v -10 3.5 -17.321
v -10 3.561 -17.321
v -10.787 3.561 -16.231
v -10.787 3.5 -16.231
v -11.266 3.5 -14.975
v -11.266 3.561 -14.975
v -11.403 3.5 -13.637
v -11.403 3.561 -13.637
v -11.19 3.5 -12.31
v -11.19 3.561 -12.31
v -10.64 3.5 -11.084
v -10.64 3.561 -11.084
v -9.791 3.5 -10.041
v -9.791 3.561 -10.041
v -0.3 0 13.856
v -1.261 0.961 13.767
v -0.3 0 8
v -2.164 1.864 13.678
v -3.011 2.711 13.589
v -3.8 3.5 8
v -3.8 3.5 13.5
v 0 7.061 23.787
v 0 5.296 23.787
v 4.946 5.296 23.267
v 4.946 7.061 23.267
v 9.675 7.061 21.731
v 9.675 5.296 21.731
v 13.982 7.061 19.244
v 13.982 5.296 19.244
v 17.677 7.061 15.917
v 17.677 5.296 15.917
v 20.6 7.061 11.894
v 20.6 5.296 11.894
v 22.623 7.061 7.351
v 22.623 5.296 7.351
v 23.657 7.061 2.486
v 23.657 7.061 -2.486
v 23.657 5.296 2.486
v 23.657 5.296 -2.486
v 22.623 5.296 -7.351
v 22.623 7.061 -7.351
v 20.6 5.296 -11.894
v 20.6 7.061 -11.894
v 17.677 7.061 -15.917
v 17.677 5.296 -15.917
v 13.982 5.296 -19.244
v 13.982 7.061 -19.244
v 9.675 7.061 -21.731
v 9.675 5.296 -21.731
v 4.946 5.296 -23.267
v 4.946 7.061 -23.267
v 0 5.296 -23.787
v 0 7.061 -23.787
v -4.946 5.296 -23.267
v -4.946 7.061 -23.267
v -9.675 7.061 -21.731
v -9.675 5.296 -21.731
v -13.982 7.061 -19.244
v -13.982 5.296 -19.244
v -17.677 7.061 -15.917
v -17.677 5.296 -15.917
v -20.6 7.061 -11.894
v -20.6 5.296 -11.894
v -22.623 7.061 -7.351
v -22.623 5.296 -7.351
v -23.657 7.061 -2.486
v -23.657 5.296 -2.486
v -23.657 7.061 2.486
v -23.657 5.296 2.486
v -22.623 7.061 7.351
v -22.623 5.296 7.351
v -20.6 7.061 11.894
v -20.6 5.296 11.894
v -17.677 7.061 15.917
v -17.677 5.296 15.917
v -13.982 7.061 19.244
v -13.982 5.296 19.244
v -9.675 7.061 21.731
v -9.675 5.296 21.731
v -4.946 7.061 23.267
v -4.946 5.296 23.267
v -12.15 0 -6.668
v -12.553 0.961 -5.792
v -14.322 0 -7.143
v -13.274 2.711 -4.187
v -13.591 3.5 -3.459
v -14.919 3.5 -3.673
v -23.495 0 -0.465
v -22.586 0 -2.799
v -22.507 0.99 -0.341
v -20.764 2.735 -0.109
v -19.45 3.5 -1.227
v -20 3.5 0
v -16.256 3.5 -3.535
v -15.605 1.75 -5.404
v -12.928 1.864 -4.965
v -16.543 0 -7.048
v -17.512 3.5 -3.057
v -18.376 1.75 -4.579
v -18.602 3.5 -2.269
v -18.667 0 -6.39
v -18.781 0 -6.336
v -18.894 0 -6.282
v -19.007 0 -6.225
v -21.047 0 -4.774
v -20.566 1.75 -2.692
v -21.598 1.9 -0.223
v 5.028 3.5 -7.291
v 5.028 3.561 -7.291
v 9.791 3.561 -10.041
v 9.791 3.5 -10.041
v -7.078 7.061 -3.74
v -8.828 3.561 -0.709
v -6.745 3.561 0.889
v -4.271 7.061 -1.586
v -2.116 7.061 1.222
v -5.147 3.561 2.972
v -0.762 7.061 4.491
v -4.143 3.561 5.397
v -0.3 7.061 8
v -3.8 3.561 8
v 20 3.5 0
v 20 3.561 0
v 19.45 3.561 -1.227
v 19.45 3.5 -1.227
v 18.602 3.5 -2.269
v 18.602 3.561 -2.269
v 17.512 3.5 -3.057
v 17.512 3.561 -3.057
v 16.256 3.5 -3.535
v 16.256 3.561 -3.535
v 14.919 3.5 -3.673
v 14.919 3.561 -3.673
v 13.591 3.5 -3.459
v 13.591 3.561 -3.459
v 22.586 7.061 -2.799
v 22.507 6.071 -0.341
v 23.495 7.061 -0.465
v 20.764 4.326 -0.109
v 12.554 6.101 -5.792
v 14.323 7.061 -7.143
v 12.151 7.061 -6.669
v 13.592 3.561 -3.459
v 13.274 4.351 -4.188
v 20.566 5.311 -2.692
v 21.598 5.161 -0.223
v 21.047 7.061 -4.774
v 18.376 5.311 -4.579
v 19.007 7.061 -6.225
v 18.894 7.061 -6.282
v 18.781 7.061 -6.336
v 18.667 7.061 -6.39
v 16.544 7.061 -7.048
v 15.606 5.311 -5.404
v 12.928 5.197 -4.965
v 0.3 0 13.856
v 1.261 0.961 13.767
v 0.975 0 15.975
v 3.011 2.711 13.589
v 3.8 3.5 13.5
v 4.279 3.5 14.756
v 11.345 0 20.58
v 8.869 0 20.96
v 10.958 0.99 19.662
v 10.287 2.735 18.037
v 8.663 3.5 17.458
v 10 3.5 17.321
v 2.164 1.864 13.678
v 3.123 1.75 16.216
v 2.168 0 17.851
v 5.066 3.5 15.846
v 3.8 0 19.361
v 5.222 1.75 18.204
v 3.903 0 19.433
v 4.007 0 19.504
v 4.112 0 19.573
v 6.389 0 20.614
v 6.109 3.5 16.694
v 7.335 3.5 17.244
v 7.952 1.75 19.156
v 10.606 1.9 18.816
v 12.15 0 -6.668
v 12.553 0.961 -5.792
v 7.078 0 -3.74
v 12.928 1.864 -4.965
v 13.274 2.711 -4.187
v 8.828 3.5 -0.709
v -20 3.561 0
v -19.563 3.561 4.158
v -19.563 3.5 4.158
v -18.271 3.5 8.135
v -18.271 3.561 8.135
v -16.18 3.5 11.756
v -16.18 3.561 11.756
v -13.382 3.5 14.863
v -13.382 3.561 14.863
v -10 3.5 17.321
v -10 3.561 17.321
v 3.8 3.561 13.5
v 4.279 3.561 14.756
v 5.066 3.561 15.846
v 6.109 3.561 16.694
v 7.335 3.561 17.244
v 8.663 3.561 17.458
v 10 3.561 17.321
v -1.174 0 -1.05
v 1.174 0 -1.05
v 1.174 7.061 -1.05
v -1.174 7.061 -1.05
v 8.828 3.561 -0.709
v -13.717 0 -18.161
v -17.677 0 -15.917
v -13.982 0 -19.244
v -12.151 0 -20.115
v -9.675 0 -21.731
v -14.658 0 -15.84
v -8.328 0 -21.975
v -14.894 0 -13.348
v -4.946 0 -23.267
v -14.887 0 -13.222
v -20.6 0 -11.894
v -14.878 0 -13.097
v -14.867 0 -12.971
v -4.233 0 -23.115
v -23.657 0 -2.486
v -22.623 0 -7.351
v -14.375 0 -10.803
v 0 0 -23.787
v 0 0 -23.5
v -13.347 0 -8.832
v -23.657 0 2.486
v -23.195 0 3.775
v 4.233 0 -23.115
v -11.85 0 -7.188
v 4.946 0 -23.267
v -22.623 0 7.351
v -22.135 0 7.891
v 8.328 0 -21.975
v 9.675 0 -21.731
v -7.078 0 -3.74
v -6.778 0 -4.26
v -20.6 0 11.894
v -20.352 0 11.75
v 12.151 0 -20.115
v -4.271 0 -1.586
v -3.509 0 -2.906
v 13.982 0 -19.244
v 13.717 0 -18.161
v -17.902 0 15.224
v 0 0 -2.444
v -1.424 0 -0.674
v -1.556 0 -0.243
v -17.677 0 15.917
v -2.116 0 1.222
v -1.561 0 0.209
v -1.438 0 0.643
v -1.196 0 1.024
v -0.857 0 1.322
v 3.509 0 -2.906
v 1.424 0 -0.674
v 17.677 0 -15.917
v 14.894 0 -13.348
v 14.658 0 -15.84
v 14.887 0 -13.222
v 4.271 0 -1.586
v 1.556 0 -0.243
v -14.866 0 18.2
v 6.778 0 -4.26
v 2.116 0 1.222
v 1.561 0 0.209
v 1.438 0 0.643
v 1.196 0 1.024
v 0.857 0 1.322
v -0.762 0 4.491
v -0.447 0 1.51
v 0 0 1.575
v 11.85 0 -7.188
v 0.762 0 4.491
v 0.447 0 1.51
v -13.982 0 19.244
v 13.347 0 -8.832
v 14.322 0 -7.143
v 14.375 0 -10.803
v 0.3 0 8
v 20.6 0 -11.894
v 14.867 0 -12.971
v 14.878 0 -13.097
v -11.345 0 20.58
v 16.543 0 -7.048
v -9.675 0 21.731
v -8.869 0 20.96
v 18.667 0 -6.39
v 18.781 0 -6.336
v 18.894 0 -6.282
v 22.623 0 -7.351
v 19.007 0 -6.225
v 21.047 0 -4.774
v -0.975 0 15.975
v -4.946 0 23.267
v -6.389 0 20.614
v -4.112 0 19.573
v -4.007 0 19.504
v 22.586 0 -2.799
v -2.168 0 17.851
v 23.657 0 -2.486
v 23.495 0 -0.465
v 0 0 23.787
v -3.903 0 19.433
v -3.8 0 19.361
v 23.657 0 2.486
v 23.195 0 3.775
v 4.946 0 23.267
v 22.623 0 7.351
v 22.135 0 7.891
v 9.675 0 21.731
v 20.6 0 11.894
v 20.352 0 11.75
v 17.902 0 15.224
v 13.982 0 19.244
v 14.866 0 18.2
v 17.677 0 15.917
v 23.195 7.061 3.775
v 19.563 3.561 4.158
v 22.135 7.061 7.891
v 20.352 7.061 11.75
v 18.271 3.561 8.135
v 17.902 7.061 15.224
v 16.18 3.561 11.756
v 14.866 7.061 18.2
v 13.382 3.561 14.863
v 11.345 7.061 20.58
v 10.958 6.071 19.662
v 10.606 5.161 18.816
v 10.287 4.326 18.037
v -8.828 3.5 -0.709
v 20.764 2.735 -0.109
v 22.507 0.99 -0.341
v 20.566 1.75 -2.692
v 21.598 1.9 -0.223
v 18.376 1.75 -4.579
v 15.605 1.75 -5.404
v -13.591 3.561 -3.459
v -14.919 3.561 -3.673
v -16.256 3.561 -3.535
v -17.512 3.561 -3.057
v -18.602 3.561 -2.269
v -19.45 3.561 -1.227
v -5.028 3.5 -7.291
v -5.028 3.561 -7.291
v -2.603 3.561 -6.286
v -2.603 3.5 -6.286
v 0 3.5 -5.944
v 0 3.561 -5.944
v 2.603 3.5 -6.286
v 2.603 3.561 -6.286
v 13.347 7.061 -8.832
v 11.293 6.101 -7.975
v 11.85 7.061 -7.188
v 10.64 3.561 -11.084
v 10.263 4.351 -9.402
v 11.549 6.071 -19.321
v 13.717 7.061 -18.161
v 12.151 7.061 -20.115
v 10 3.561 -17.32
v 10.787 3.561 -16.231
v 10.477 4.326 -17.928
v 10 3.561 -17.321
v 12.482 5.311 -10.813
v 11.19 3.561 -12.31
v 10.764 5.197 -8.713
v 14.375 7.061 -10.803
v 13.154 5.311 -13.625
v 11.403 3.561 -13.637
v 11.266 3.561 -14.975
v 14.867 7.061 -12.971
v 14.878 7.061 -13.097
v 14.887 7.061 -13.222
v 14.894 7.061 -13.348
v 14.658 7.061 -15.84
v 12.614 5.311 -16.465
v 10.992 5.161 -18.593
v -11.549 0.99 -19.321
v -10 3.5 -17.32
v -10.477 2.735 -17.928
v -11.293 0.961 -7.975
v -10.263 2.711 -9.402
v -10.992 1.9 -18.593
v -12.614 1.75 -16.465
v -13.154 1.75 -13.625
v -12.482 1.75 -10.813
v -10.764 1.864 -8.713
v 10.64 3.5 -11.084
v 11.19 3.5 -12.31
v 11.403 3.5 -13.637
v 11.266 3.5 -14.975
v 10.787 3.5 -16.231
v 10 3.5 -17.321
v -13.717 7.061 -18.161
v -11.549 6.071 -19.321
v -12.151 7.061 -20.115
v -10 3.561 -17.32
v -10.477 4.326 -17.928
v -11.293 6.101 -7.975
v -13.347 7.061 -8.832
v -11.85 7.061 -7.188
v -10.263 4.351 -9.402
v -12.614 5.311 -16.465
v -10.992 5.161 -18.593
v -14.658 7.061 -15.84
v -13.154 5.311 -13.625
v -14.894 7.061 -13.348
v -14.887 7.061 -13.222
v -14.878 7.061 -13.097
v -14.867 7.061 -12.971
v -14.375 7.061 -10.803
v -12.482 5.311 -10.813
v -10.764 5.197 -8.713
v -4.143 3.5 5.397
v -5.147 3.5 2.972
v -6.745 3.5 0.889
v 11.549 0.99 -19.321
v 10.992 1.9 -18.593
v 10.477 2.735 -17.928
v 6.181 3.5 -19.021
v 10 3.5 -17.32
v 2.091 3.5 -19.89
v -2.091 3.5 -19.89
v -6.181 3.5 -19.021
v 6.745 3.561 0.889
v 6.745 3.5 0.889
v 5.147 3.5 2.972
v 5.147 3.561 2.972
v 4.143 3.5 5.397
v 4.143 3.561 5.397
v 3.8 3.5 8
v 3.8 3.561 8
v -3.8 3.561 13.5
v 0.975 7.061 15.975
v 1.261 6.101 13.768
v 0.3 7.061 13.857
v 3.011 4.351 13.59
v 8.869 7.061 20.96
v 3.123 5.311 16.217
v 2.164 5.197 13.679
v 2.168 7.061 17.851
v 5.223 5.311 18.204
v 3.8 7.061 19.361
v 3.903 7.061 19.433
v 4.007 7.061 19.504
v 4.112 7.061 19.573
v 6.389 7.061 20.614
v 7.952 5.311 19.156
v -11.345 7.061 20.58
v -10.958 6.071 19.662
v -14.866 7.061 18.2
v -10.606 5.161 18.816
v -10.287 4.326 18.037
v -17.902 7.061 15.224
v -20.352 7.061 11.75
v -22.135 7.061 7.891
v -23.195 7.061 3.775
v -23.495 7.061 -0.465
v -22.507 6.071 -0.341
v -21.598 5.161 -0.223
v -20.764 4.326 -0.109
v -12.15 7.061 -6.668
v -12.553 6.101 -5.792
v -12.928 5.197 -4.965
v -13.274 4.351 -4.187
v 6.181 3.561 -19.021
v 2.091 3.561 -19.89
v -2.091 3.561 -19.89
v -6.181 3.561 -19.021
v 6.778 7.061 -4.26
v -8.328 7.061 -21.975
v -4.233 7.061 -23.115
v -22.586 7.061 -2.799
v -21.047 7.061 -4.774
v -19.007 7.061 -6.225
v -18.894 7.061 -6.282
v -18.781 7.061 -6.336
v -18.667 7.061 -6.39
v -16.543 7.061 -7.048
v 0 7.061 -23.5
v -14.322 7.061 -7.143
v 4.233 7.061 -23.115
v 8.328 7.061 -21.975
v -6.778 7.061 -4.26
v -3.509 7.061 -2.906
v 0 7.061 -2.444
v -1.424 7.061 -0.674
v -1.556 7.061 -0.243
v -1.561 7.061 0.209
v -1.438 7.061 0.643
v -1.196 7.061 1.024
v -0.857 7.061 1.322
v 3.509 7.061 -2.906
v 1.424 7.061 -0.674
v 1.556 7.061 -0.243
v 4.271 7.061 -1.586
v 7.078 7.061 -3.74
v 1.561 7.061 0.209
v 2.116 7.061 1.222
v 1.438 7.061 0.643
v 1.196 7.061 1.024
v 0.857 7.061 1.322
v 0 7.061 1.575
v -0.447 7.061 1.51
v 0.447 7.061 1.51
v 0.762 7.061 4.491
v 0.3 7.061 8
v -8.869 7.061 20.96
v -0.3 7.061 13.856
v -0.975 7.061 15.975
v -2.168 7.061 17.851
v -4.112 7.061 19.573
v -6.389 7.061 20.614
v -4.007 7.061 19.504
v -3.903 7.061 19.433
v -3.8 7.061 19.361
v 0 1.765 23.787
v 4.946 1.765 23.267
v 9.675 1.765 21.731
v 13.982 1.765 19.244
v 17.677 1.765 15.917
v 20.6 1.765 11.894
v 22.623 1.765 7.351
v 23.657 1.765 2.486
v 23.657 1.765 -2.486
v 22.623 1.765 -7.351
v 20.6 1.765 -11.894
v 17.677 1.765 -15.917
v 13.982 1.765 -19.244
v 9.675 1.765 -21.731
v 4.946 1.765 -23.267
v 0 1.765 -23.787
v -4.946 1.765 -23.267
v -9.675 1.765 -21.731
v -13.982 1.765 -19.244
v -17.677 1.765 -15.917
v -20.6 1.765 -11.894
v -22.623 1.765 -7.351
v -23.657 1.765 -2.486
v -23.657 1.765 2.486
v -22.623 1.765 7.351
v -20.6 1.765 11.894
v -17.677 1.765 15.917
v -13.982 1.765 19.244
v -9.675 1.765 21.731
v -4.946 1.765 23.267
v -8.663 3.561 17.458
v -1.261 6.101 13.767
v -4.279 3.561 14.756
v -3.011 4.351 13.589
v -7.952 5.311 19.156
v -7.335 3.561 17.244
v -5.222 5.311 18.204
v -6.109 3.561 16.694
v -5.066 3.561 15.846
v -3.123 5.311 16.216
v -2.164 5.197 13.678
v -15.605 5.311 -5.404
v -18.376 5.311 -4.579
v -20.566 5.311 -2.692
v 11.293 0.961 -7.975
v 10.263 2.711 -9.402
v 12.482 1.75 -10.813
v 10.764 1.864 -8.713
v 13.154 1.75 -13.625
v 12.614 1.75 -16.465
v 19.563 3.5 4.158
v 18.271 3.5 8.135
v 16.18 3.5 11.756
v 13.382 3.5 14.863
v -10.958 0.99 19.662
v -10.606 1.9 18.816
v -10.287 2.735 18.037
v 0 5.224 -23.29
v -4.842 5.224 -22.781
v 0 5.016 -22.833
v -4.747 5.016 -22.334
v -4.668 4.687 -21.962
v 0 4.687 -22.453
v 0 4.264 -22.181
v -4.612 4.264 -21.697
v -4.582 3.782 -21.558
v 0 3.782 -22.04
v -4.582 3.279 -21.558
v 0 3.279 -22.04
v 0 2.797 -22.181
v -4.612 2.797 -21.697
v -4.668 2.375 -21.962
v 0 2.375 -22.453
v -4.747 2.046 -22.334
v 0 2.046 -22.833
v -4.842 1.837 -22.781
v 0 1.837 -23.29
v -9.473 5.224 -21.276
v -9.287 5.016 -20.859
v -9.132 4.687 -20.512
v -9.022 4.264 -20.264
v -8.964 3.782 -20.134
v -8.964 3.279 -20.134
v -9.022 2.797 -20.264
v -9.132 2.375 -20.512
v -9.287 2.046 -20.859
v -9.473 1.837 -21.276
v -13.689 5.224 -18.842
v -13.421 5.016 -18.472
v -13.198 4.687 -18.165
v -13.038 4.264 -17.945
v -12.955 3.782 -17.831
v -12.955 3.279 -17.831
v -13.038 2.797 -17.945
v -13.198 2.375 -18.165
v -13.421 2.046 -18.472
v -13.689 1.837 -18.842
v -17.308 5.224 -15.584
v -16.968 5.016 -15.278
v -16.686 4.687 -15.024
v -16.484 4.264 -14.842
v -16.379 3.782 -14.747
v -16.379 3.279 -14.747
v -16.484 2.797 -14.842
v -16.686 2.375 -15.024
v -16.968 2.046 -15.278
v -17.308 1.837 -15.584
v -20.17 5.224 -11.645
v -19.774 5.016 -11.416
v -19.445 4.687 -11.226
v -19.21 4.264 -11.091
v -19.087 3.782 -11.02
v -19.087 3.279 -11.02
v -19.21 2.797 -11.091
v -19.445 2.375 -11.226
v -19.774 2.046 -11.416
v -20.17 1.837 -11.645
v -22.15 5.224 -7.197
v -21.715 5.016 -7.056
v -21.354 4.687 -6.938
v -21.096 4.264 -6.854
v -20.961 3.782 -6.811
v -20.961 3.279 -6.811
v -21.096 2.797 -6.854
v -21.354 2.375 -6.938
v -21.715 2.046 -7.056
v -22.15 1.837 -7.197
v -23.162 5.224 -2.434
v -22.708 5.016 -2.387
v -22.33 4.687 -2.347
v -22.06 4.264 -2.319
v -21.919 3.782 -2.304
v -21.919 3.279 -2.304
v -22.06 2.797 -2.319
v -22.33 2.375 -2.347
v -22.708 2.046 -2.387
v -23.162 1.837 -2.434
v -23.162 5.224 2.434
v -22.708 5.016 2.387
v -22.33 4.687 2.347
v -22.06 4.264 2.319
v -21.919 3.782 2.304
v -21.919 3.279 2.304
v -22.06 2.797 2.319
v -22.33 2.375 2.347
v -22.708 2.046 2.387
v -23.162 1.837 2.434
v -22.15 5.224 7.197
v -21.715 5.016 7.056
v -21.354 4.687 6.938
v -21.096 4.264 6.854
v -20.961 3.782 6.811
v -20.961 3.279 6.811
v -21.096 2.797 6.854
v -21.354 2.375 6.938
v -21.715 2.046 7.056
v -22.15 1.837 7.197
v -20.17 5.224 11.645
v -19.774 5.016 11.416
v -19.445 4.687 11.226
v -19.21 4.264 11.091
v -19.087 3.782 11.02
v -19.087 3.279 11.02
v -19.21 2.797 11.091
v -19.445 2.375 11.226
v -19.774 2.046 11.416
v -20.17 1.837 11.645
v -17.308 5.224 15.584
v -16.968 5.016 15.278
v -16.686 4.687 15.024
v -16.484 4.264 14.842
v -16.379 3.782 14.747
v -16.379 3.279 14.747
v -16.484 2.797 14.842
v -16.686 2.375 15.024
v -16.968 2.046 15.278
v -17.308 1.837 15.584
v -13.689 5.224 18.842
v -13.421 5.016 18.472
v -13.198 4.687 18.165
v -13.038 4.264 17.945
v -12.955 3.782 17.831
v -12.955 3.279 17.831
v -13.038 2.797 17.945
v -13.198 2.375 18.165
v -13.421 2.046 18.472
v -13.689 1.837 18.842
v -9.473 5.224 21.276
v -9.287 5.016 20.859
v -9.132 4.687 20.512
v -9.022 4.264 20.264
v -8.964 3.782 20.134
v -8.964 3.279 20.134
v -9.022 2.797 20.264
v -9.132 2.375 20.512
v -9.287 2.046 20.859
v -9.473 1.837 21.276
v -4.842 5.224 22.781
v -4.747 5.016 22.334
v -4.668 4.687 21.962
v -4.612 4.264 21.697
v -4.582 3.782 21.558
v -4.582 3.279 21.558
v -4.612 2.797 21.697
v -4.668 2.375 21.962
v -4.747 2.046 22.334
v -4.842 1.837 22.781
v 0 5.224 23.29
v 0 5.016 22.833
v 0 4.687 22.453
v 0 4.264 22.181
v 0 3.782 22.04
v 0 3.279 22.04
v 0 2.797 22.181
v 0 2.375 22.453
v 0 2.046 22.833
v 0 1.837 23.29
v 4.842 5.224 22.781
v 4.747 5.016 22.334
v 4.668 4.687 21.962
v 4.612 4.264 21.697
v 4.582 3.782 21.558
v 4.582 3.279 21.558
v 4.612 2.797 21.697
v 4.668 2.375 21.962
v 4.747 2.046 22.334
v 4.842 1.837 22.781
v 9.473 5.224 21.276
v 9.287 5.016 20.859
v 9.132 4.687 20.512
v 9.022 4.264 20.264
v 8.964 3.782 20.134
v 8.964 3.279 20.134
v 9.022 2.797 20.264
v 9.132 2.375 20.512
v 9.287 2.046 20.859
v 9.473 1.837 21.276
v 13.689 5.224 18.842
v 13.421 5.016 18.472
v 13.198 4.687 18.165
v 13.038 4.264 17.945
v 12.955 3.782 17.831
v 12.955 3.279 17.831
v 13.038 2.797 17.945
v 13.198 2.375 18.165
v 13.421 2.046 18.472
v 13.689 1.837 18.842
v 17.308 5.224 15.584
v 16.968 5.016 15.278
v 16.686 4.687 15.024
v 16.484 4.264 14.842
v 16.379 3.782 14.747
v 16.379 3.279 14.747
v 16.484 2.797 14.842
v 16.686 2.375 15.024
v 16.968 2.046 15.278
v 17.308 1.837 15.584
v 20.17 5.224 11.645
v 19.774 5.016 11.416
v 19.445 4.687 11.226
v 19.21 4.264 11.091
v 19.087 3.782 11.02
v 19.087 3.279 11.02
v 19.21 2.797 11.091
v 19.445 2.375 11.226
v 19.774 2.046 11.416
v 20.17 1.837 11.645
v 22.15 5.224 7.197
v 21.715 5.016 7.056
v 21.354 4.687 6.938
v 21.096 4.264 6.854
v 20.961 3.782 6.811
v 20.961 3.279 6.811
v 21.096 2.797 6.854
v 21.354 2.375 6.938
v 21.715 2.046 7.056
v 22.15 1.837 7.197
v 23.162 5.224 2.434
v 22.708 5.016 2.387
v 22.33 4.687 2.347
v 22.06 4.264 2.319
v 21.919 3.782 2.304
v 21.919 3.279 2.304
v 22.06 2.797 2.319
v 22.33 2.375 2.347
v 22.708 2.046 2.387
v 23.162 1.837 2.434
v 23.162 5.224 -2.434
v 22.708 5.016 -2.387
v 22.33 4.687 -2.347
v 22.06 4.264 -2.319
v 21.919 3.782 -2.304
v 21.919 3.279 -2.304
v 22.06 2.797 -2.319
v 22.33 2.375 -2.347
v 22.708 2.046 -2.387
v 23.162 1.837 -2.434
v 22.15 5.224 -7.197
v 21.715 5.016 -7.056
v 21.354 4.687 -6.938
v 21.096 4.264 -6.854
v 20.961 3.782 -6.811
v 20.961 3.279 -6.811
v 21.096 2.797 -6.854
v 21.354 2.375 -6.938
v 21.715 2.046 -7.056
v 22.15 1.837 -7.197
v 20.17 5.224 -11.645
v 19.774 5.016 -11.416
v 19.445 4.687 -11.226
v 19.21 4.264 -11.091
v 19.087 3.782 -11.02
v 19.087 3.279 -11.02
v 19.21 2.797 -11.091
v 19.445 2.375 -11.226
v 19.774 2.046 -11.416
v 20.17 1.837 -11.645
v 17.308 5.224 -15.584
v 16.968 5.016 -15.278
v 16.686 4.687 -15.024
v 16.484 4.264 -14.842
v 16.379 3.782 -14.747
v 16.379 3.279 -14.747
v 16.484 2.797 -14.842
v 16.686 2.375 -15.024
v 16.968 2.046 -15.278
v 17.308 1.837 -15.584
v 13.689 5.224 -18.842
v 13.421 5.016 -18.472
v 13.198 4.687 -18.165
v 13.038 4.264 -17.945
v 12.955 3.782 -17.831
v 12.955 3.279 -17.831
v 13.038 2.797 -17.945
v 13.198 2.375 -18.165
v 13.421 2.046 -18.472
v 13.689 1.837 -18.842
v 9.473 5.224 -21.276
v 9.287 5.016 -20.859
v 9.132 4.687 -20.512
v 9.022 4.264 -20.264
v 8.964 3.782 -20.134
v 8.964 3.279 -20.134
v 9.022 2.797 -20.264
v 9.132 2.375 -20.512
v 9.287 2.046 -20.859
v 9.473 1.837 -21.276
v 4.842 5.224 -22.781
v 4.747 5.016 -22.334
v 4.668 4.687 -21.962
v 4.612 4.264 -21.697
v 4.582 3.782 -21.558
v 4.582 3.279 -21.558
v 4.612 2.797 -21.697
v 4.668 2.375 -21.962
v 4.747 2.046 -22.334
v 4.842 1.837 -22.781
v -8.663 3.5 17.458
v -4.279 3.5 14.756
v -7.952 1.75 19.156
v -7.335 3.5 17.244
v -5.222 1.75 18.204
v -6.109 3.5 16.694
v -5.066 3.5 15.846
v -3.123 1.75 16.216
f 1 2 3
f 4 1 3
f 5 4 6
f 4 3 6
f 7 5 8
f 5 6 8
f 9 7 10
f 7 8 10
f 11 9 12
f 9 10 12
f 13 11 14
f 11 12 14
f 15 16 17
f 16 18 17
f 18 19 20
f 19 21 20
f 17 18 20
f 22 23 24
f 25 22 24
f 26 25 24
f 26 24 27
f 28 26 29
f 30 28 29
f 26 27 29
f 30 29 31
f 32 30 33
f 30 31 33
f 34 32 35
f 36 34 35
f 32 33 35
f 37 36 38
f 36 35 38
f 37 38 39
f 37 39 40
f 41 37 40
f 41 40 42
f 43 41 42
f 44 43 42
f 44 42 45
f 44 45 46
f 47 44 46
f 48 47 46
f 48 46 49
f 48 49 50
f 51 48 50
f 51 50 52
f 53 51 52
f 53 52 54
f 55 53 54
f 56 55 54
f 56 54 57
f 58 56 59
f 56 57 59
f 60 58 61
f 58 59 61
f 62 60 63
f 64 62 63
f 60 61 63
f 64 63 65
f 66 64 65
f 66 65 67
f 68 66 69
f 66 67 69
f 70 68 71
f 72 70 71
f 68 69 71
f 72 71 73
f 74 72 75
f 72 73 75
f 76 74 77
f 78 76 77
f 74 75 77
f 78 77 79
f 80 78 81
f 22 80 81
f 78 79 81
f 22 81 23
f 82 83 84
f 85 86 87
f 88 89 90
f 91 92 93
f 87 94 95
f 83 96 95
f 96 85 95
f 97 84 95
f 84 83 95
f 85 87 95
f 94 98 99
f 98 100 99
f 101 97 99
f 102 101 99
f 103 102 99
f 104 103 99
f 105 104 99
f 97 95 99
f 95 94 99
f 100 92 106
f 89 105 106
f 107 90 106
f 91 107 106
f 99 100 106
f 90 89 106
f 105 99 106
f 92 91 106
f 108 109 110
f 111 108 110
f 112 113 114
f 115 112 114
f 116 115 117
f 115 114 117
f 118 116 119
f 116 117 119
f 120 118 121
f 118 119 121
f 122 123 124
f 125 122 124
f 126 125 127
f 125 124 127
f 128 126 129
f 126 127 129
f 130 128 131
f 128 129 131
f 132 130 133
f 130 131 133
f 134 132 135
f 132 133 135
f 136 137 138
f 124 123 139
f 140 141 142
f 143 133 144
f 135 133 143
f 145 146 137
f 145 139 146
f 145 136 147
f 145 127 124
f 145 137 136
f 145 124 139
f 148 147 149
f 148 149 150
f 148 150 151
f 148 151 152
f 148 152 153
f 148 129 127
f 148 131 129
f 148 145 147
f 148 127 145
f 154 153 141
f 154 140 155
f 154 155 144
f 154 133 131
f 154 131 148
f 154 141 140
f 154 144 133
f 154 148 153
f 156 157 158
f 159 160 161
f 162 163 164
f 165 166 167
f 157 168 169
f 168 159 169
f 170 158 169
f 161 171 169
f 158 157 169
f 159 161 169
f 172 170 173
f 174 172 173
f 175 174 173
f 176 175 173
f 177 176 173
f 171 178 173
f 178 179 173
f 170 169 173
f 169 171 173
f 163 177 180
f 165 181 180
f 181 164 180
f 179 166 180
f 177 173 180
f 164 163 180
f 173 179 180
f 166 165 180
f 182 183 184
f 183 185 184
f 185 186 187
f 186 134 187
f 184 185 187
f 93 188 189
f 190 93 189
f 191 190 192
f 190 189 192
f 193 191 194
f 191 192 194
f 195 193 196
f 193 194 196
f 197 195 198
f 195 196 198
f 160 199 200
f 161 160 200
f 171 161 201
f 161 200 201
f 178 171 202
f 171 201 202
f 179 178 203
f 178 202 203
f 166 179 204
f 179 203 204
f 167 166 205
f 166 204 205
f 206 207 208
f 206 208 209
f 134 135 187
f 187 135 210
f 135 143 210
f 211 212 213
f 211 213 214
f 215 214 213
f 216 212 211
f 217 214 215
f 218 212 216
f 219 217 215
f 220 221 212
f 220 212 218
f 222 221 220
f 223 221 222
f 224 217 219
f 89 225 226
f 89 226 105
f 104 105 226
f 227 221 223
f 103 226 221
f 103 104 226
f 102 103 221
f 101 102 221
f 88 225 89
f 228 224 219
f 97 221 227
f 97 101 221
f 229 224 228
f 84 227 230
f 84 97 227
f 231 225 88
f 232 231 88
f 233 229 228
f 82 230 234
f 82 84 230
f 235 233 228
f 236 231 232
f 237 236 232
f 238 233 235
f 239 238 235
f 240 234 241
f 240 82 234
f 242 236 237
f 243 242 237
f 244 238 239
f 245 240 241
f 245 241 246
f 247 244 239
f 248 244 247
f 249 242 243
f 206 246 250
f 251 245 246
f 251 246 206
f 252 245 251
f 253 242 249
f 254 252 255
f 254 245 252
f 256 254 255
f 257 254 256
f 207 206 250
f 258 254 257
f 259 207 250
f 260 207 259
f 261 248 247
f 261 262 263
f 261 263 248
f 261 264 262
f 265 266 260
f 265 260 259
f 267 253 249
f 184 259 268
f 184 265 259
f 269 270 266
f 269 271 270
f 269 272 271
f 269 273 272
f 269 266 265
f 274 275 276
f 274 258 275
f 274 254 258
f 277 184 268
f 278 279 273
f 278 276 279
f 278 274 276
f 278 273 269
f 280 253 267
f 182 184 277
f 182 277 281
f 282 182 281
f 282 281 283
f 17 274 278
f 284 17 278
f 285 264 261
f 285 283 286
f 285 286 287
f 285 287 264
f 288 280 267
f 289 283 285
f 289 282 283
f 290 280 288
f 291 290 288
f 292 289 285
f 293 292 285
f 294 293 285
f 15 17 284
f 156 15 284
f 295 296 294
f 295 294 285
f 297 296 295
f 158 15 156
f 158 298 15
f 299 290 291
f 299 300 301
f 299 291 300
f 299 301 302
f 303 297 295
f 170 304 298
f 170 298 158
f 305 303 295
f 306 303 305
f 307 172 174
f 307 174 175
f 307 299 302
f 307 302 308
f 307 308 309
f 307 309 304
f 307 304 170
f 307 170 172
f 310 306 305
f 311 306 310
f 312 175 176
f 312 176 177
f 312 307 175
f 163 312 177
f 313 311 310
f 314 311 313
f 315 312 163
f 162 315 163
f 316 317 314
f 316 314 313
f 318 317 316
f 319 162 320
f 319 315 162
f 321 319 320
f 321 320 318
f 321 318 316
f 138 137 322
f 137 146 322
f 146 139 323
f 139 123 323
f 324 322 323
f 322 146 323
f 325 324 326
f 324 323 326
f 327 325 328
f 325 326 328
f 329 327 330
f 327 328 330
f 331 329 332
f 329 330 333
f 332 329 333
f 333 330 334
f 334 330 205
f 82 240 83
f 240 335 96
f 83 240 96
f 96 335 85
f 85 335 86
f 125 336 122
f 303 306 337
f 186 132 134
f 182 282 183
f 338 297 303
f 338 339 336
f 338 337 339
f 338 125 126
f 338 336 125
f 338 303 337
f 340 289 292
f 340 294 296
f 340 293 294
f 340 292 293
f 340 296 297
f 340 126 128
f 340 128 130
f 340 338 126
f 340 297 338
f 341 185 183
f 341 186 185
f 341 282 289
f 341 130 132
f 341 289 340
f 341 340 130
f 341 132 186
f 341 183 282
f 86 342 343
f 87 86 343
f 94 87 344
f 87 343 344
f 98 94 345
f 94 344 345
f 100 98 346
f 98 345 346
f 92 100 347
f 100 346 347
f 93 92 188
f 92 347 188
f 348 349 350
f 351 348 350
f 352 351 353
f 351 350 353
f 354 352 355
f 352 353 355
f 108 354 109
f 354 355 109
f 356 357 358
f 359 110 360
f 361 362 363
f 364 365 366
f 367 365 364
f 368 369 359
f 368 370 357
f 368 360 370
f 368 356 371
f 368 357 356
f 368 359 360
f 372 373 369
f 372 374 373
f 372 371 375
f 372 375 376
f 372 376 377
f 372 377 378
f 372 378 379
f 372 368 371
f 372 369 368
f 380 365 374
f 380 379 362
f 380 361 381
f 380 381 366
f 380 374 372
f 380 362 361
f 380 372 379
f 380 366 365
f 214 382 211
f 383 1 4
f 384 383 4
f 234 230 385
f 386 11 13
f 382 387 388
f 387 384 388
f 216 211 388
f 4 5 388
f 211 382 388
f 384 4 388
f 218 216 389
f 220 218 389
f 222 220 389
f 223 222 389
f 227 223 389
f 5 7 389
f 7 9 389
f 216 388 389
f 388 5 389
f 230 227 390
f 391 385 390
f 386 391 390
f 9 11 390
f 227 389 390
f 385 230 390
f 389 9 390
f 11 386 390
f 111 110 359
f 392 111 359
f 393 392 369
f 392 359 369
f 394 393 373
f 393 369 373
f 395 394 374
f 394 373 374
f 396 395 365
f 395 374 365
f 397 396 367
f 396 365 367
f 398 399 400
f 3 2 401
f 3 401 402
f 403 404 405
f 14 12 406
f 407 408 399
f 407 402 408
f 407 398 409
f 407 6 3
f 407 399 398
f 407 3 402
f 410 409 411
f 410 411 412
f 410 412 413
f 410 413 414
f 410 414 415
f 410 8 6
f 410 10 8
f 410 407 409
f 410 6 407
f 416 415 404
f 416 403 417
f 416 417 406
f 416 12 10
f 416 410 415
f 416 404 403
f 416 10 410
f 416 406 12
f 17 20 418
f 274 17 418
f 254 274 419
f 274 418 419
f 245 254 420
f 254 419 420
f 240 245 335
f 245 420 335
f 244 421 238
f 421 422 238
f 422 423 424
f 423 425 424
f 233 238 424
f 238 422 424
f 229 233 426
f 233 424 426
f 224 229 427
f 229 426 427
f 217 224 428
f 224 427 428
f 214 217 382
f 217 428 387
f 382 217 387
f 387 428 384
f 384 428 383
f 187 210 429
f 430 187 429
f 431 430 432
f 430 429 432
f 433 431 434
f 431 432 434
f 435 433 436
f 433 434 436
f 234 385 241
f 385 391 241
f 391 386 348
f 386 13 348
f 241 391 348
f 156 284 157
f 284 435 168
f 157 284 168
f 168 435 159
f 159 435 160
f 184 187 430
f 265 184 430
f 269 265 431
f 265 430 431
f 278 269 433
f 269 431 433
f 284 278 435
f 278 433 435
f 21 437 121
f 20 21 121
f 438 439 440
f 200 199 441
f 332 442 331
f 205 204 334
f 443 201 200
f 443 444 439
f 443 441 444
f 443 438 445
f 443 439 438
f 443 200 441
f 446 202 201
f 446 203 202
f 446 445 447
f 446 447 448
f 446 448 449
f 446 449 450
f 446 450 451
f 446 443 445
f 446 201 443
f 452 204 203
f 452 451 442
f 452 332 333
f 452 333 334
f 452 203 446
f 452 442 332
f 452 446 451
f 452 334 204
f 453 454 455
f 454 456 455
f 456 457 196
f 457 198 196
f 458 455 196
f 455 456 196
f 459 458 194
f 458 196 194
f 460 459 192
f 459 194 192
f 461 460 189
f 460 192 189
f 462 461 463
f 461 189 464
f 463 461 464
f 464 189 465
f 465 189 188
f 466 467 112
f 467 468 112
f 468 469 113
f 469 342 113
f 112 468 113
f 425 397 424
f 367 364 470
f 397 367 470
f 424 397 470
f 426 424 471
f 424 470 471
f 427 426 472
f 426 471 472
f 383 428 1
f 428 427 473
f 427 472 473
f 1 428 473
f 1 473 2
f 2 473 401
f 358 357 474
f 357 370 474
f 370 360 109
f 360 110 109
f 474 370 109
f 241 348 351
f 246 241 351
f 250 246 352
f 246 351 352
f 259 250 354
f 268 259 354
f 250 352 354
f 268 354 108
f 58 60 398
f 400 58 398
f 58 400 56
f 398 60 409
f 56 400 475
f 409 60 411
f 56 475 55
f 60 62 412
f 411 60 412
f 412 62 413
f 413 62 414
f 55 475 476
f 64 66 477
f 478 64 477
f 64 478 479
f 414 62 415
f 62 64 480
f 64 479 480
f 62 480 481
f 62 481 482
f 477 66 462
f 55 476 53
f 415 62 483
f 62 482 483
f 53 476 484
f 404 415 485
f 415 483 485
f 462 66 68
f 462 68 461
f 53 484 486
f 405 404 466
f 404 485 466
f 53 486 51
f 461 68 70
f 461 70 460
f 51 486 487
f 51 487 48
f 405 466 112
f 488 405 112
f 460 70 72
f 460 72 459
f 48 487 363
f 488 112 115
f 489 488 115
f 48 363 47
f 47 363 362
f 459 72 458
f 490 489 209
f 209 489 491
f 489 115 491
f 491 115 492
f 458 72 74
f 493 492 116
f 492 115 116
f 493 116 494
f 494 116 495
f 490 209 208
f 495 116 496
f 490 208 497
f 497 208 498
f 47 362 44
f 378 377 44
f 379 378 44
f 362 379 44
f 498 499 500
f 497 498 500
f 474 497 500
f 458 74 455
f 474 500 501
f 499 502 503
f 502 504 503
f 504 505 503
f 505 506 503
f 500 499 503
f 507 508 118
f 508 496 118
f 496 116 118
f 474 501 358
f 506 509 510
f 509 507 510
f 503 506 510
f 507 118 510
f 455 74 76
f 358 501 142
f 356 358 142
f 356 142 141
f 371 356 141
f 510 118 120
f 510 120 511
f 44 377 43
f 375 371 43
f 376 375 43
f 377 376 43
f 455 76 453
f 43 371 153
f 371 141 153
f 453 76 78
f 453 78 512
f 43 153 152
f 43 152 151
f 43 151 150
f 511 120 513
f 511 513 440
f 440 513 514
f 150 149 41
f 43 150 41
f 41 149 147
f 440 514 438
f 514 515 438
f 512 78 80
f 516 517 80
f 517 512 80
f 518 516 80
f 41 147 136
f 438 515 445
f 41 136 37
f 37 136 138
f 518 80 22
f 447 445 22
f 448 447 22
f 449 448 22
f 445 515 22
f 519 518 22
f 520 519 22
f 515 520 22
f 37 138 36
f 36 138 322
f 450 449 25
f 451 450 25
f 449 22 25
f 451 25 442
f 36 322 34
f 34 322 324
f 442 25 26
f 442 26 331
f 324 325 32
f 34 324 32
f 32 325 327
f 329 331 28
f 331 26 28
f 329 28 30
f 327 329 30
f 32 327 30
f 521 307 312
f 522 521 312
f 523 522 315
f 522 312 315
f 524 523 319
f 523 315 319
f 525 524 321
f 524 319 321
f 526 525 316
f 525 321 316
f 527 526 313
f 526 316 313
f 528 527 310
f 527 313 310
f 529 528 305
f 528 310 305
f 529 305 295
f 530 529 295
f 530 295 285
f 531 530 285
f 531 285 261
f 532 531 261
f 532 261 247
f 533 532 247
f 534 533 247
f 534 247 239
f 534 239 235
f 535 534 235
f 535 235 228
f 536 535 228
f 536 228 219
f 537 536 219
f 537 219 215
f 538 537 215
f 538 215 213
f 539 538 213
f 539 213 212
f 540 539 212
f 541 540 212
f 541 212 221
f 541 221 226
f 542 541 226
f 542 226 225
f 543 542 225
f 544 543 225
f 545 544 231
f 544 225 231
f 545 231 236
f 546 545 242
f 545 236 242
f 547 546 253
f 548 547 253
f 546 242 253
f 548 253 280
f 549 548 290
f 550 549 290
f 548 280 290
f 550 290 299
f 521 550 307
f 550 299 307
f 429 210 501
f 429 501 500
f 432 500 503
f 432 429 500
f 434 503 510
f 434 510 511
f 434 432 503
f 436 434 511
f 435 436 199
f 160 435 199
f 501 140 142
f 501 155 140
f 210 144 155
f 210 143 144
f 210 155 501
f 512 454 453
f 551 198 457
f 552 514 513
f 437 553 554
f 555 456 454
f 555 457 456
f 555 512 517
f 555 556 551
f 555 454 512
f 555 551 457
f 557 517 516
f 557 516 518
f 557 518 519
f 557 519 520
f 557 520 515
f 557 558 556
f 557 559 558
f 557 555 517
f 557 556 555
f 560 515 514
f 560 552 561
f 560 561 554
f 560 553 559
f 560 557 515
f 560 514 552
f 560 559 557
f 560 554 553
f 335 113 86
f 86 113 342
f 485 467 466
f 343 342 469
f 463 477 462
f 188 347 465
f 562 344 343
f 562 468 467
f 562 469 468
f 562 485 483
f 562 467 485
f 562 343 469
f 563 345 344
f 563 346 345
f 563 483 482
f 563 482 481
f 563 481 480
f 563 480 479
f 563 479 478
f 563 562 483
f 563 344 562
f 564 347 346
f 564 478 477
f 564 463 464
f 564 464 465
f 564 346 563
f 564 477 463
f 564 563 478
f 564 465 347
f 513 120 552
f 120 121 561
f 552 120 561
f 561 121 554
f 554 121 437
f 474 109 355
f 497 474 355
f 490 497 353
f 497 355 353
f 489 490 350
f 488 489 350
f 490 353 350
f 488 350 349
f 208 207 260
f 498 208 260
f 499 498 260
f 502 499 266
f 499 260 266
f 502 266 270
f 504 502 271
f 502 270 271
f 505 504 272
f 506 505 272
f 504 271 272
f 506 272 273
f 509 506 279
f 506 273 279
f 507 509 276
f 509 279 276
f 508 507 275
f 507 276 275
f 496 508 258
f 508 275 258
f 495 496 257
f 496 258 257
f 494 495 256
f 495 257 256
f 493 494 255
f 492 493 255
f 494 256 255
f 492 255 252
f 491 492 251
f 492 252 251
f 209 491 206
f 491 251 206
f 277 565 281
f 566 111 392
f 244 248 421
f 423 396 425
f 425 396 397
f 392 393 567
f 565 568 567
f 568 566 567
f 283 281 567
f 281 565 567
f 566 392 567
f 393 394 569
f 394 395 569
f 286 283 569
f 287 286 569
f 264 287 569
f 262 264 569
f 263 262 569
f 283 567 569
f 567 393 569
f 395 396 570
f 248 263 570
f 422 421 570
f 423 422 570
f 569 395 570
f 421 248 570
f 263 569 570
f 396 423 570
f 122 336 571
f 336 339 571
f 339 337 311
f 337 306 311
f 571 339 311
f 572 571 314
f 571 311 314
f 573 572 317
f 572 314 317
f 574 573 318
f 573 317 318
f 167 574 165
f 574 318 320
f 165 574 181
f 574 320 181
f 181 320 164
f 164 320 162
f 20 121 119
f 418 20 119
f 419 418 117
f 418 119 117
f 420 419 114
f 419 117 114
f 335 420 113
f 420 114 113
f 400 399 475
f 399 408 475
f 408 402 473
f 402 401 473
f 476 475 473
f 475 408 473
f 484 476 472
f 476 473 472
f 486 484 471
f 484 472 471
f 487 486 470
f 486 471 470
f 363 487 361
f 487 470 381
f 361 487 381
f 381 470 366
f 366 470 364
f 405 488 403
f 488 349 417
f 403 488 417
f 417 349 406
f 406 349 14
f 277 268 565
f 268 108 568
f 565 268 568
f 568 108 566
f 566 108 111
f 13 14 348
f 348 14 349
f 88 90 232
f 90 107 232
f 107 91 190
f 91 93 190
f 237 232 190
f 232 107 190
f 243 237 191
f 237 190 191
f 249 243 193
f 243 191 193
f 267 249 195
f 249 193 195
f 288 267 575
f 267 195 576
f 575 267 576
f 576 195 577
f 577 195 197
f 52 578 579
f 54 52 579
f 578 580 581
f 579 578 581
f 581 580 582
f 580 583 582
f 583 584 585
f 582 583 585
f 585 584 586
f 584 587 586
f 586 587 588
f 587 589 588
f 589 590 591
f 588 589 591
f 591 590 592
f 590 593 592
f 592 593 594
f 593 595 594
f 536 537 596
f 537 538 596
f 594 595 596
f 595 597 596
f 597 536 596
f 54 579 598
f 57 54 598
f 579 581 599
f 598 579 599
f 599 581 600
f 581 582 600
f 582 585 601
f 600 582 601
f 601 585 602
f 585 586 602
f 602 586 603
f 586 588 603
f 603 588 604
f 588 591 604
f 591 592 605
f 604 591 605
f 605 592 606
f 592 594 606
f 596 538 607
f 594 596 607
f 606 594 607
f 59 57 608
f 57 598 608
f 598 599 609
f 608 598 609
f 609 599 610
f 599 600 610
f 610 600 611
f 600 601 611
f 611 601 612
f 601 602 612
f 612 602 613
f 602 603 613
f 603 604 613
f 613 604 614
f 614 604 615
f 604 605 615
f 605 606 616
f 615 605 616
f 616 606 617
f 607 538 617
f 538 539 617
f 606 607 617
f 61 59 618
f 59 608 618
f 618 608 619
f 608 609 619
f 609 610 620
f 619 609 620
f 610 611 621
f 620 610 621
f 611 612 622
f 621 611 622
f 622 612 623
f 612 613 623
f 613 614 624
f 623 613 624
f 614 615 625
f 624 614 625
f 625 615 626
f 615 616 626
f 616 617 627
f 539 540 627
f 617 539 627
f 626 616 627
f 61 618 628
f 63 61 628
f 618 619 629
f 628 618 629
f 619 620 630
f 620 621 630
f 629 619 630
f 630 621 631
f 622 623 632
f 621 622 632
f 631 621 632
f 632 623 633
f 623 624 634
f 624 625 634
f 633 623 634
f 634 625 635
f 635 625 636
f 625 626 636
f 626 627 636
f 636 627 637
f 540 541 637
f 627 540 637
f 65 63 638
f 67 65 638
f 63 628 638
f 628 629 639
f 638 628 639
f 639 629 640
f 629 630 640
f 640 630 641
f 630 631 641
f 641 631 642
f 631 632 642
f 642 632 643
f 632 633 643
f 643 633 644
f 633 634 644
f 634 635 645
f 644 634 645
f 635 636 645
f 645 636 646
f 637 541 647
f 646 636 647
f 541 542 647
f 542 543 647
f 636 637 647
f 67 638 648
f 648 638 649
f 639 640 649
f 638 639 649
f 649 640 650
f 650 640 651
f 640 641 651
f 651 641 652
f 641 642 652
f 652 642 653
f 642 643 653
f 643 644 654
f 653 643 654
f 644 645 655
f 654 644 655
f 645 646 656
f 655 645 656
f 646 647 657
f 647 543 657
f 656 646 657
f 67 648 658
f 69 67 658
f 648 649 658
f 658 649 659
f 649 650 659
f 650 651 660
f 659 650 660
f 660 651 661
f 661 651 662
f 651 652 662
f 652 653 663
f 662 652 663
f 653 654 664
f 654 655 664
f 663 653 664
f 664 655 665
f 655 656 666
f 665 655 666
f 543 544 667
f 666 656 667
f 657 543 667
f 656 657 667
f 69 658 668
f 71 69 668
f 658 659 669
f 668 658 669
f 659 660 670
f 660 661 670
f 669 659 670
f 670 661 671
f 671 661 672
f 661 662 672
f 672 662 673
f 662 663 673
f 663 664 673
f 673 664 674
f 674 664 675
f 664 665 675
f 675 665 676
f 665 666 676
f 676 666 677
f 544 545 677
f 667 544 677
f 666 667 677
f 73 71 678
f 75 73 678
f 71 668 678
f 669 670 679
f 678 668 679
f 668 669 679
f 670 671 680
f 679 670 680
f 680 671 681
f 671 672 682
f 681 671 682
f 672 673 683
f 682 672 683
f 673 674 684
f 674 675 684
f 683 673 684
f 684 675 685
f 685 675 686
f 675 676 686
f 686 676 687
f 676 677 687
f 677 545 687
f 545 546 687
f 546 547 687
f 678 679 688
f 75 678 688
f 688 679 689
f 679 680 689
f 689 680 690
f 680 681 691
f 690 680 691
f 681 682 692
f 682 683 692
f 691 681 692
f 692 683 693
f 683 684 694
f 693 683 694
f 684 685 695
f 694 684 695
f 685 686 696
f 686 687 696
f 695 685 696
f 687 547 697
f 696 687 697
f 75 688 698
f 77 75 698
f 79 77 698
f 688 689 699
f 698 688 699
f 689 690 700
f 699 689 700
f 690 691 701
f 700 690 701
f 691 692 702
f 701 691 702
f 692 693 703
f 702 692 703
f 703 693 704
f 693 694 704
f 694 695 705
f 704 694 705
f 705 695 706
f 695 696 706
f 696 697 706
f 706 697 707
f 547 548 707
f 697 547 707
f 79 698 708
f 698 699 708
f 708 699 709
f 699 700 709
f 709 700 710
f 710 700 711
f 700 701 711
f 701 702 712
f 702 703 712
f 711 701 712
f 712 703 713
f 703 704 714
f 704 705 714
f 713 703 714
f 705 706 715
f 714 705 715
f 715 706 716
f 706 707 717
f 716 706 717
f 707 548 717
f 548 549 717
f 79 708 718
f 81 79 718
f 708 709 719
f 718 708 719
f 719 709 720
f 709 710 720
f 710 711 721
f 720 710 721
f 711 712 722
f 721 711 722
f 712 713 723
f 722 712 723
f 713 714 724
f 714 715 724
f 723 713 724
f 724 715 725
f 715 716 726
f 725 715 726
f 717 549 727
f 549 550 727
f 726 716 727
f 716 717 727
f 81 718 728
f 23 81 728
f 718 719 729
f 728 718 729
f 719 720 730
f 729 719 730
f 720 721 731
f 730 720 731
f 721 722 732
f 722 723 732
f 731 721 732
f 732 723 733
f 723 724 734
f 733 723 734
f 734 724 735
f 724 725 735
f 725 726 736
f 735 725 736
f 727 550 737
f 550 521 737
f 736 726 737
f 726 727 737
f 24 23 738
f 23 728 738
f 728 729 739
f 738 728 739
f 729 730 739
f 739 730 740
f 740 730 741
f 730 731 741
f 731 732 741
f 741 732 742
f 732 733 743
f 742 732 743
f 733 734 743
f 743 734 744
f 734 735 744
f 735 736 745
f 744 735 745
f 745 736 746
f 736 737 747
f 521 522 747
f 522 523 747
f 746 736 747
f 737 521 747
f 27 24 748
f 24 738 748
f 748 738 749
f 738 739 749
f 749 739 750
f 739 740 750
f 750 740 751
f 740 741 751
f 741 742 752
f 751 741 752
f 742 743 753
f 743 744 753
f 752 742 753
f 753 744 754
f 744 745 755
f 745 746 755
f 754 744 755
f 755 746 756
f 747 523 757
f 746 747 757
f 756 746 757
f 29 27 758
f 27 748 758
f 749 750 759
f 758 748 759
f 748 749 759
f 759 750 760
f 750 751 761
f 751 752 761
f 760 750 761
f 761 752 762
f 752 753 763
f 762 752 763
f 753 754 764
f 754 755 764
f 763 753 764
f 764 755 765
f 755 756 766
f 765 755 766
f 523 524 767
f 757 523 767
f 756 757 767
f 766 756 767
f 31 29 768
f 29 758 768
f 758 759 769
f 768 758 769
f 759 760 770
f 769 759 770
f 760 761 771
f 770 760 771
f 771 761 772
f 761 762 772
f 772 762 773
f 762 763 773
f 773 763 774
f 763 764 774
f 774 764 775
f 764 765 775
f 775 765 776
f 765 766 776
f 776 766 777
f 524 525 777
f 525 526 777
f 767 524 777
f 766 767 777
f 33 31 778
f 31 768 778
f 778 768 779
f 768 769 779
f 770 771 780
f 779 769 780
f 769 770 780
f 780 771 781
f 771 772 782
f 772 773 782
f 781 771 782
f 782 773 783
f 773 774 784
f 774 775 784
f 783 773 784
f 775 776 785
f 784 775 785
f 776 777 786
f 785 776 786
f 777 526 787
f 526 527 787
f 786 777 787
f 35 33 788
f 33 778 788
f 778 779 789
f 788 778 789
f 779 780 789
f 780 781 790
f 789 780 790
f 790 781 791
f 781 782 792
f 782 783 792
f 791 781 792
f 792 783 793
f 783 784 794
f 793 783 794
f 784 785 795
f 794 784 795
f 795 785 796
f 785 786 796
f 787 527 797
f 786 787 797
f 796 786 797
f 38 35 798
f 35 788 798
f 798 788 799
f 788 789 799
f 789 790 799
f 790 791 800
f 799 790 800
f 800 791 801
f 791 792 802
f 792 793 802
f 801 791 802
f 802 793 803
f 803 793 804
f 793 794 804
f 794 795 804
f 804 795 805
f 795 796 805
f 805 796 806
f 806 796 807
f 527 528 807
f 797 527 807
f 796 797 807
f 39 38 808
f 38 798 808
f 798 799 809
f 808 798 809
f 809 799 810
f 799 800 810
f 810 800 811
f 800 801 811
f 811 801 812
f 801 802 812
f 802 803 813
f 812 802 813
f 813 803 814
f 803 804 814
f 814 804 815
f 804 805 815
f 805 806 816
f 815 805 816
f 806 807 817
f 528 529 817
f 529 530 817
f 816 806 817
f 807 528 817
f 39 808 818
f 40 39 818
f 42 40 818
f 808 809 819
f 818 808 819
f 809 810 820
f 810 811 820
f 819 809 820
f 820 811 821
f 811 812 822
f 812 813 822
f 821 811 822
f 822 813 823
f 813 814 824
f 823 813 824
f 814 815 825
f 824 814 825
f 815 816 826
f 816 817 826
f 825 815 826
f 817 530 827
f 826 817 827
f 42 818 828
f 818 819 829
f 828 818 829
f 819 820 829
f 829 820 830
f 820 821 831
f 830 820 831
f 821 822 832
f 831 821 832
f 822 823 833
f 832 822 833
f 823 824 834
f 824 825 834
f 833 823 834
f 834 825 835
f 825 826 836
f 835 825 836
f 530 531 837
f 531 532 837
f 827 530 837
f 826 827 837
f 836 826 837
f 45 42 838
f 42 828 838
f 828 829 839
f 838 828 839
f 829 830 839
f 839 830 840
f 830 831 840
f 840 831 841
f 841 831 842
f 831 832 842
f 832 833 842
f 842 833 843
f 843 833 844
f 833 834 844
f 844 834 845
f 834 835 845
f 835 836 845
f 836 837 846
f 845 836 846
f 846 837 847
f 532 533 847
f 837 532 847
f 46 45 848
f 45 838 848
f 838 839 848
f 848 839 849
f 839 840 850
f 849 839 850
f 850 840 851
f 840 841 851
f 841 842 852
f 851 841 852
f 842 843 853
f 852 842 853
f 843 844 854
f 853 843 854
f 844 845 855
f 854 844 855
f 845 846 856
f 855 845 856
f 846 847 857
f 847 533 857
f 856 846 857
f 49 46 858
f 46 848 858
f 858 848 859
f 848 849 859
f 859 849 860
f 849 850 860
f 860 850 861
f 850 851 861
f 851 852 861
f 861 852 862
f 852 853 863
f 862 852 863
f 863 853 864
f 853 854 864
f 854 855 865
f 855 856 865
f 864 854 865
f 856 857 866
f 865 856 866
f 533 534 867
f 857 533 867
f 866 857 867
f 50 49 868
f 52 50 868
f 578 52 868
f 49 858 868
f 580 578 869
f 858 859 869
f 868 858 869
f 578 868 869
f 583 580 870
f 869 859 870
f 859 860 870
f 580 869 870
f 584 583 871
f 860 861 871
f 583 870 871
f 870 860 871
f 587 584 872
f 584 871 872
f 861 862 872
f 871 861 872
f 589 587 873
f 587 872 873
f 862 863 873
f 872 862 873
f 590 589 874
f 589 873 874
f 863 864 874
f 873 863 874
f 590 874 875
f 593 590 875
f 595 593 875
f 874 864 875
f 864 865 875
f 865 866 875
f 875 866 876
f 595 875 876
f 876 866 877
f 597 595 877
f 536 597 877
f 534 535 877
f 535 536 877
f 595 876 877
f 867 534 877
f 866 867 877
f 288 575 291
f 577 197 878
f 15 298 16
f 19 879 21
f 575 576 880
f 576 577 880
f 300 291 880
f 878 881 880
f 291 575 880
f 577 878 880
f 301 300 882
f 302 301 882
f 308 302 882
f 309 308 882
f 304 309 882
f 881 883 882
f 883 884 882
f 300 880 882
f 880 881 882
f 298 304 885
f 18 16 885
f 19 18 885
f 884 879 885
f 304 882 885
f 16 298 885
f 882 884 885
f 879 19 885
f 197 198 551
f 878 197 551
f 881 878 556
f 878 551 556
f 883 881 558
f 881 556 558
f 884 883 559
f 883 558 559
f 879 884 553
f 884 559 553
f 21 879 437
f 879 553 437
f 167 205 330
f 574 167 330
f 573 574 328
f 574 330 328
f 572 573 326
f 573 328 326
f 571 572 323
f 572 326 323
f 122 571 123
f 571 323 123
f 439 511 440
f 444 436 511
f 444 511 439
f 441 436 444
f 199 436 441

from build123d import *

# Parameters (mm, degrees)
SKETCH1_R           = 23.7871
BOSS_EXTRUDE1_DEPTH = 7.0612
SKETCH3_R           = 1.7653
SKETCH5_R           = 1.575
CUT_EXTRUDE1_DEPTH  = 7.0612
BOSS_EXTRUDE3_DEPTH = 7.0612
CUT_EXTRUDE2_DEPTH  = 10
CHAMFER1_SIZE       = 3.5
CHAMFER2_SIZE       = 3.5
CHAMFER3_SIZE       = 3.5
CHAMFER4_SIZE       = 3.5
CHAMFER5_SIZE       = 3.5
CHAMFER6_SIZE       = 3.5


with BuildPart() as part:
    # Sketch1 → Boss-Extrude1 (new body)
    with BuildSketch(Plane(origin=(0, 0, 0), x_dir=(1, 0, 0), z_dir=(0, 1, 0))):
        with Locations(Location((0, 0, 0), (0, 0, 270))):
            Circle(SKETCH1_R)
    extrude(amount=BOSS_EXTRUDE1_DEPTH)

    # Sketch3 → Cut-Revolve1 (revolve, cut)
    with BuildSketch(Plane(origin=(0, 0, 0), x_dir=(0, 0, -1), z_dir=(1, 0, 0))):
        with Locations((23.7871, 3.5306)):
            Circle(SKETCH3_R)
    revolve(axis=Axis((0, 3.5306, 0), (0, 1, 0)), mode=Mode.SUBTRACT)

    # Sketch5 → Cut-Extrude1 (cut)
    with BuildSketch(Plane.XZ):
        with Locations(Location((0, 0, 0), (0, 0, 270))):
            Circle(SKETCH5_R)
    extrude(amount=-CUT_EXTRUDE1_DEPTH, mode=Mode.SUBTRACT)

    # Sketch8 → Boss-Extrude3 (add)
    with BuildSketch(Plane.XZ):
        with BuildLine():
            ThreePointArc((-1.173935688, -1.05), (0, -1.575), (1.173935688, -1.05))
            Line((1.173935688, -1.05), (-1.173935688, -1.05))
        make_face()
    extrude(amount=-BOSS_EXTRUDE3_DEPTH)

    # Sketch18 → Cut-Extrude2 (cut)
    with BuildSketch(Plane(origin=(0, 7.0612, 0), x_dir=(1, 0, 0), z_dir=(0, 1, 0))):
        with BuildLine():
            Line((-8.82820323, 0.709103466), (-13.591342951, 3.459103466))
            ThreePointArc((-13.591342951, 3.459103466), (-17.51207526, 3.056828066), (-20, 0))
            ThreePointArc((-20, 0), (-17.320508076, -10), (-10, -17.320508076))
            ThreePointArc((-10, -17.320508076), (-6.10874687, -16.694316081), (-3.8, -13.5))
            Line((-3.8, -13.5), (-3.8, -8))
            ThreePointArc((-3.8, -8), (-5.147302995, -2.97179677), (-8.82820323, 0.709103466))
        make_face()
        with BuildLine():
            Line((3.8, -8), (3.8, -13.5))
            ThreePointArc((3.8, -13.5), (6.10874687, -16.694316081), (10, -17.320508076))
            ThreePointArc((10, -17.320508076), (17.320508076, -10), (20, 0))
            ThreePointArc((20, 0), (17.51207526, 3.056828066), (13.591342951, 3.459103466))
            Line((13.591342951, 3.459103466), (8.82820323, 0.709103466))
            ThreePointArc((8.82820323, 0.709103466), (5.147302995, -2.97179677), (3.8, -8))
        make_face()
        with BuildLine():
            Line((5.02820323, 7.290896534), (9.791342951, 10.040896534))
            ThreePointArc((9.791342951, 10.040896534), (11.40332839, 13.637488015), (10, 17.320508076))
            ThreePointArc((10, 17.320508076), (0, 20), (-10, 17.320508076))
            ThreePointArc((-10, 17.320508076), (-11.40332839, 13.637488015), (-9.791342951, 10.040896534))
            Line((-9.791342951, 10.040896534), (-5.02820323, 7.290896534))
            ThreePointArc((-5.02820323, 7.290896534), (0, 5.943593539), (5.02820323, 7.290896534))
        make_face()
    extrude(amount=-CUT_EXTRUDE2_DEPTH, mode=Mode.SUBTRACT)

    # Chamfer1
    chamfer1_edges = [part.edges().sort_by_distance(p)[0] for p in [
        (-17.51207526, 7.0612, -3.056828066),
    ]]
    chamfer(chamfer1_edges, length=CHAMFER1_SIZE)
    chamfer1_2_edges = [part.edges().sort_by_distance(p)[0] for p in [
        (-6.10874687, 7.0612, 16.694316081),
    ]]
    chamfer(chamfer1_2_edges, length=CHAMFER1_SIZE)
    chamfer1_3_edges = [part.edges().sort_by_distance(p)[0] for p in [
        (-11.209773091, 7.0612, -2.084103466),
        (-3.8, 7.0612, 10.75),
        (-5.147302995, 7.0612, 2.97179677),
    ]]
    chamfer(chamfer1_3_edges, length=CHAMFER1_SIZE)
    chamfer1_4_edges = [part.edges().sort_by_distance(p)[0] for p in [
        (-17.320508076, 7.0612, 10),
    ]]
    chamfer(chamfer1_4_edges, length=CHAMFER1_SIZE - 0.0001)  # a hair under: the kernel refuses the full size

    # Chamfer2
    chamfer2_edges = [part.edges().sort_by_distance(p)[0] for p in [
        (-11.40332839, 7.0612, -13.637488015),
    ]]
    chamfer(chamfer2_edges, length=CHAMFER2_SIZE)
    chamfer2_2_edges = [part.edges().sort_by_distance(p)[0] for p in [
        (11.40332839, 7.0612, -13.637488015),
    ]]
    chamfer(chamfer2_2_edges, length=CHAMFER2_SIZE)
    chamfer2_3_edges = [part.edges().sort_by_distance(p)[0] for p in [
        (7.409773091, 7.0612, -8.665896534),
        (0, 7.0612, -5.943593539),
        (-7.409773091, 7.0612, -8.665896534),
    ]]
    chamfer(chamfer2_3_edges, length=CHAMFER2_SIZE)
    chamfer2_4_edges = [part.edges().sort_by_distance(p)[0] for p in [
        (0, 7.0612, -20),
    ]]
    chamfer(chamfer2_4_edges, length=CHAMFER2_SIZE - 0.0001)  # a hair under: the kernel refuses the full size

    # Chamfer3
    chamfer3_edges = [part.edges().sort_by_distance(p)[0] for p in [
        (17.51207526, 7.0612, -3.056828066),
    ]]
    chamfer(chamfer3_edges, length=CHAMFER3_SIZE)
    chamfer3_2_edges = [part.edges().sort_by_distance(p)[0] for p in [
        (6.10874687, 7.0612, 16.694316081),
    ]]
    chamfer(chamfer3_2_edges, length=CHAMFER3_SIZE)
    chamfer3_3_edges = [part.edges().sort_by_distance(p)[0] for p in [
        (5.147302995, 7.0612, 2.97179677),
        (11.209773091, 7.0612, -2.084103466),
        (3.8, 7.0612, 10.75),
    ]]
    chamfer(chamfer3_3_edges, length=CHAMFER3_SIZE - 0.0001)  # a hair under: the kernel refuses the full size
    chamfer3_4_edges = [part.edges().sort_by_distance(p)[0] for p in [
        (17.320508076, 7.0612, 10),
    ]]
    chamfer(chamfer3_4_edges, length=CHAMFER3_SIZE - 0.0001)  # a hair under: the kernel refuses the full size

    # Chamfer4
    chamfer4_edges = [part.edges().sort_by_distance(p)[0] for p in [
        (17.51207526, 0, -3.056828066),
    ]]
    chamfer(chamfer4_edges, length=CHAMFER4_SIZE)
    chamfer4_2_edges = [part.edges().sort_by_distance(p)[0] for p in [
        (6.10874687, 0, 16.694316081),
    ]]
    chamfer(chamfer4_2_edges, length=CHAMFER4_SIZE)
    chamfer4_3_edges = [part.edges().sort_by_distance(p)[0] for p in [
        (17.320508076, 0, 10),
    ]]
    chamfer(chamfer4_3_edges, length=CHAMFER4_SIZE - 0.0001)  # a hair under: the kernel refuses the full size
    chamfer4_4_edges = [part.edges().sort_by_distance(p)[0] for p in [
        (11.209773091, 0, -2.084103466),
        (3.8, 0, 10.75),
        (5.147302995, 0, 2.97179677),
    ]]
    chamfer(chamfer4_4_edges, length=CHAMFER4_SIZE)

    # Chamfer5
    chamfer5_edges = [part.edges().sort_by_distance(p)[0] for p in [
        (-11.40332839, 0, -13.637488015),
    ]]
    chamfer(chamfer5_edges, length=CHAMFER5_SIZE)
    chamfer5_2_edges = [part.edges().sort_by_distance(p)[0] for p in [
        (11.40332839, 0, -13.637488015),
    ]]
    chamfer(chamfer5_2_edges, length=CHAMFER5_SIZE)
    chamfer5_3_edges = [part.edges().sort_by_distance(p)[0] for p in [
        (7.409773091, 0, -8.665896534),
        (0, 0, -5.943593539),
        (-7.409773091, 0, -8.665896534),
    ]]
    chamfer(chamfer5_3_edges, length=CHAMFER5_SIZE)
    chamfer5_4_edges = [part.edges().sort_by_distance(p)[0] for p in [
        (0, 0, -20),
    ]]
    chamfer(chamfer5_4_edges, length=CHAMFER5_SIZE - 0.0001)  # a hair under: the kernel refuses the full size

    # Chamfer6
    chamfer6_edges = [part.edges().sort_by_distance(p)[0] for p in [
        (-6.10874687, 0, 16.694316081),
    ]]
    chamfer(chamfer6_edges, length=CHAMFER6_SIZE)
    chamfer6_2_edges = [part.edges().sort_by_distance(p)[0] for p in [
        (-17.51207526, 0, -3.056828066),
    ]]
    chamfer(chamfer6_2_edges, length=CHAMFER6_SIZE)
    chamfer6_3_edges = [part.edges().sort_by_distance(p)[0] for p in [
        (-11.209773091, 0, -2.084103466),
        (-5.147302995, 0, 2.97179677),
        (-3.8, 0, 10.75),
    ]]
    chamfer(chamfer6_3_edges, length=CHAMFER6_SIZE)
    chamfer6_4_edges = [part.edges().sort_by_distance(p)[0] for p in [
        (-17.320508076, 0, 10),
    ]]
    chamfer(chamfer6_4_edges, length=CHAMFER6_SIZE - 0.0001)  # a hair under: the kernel refuses the full size


solid = part.part
